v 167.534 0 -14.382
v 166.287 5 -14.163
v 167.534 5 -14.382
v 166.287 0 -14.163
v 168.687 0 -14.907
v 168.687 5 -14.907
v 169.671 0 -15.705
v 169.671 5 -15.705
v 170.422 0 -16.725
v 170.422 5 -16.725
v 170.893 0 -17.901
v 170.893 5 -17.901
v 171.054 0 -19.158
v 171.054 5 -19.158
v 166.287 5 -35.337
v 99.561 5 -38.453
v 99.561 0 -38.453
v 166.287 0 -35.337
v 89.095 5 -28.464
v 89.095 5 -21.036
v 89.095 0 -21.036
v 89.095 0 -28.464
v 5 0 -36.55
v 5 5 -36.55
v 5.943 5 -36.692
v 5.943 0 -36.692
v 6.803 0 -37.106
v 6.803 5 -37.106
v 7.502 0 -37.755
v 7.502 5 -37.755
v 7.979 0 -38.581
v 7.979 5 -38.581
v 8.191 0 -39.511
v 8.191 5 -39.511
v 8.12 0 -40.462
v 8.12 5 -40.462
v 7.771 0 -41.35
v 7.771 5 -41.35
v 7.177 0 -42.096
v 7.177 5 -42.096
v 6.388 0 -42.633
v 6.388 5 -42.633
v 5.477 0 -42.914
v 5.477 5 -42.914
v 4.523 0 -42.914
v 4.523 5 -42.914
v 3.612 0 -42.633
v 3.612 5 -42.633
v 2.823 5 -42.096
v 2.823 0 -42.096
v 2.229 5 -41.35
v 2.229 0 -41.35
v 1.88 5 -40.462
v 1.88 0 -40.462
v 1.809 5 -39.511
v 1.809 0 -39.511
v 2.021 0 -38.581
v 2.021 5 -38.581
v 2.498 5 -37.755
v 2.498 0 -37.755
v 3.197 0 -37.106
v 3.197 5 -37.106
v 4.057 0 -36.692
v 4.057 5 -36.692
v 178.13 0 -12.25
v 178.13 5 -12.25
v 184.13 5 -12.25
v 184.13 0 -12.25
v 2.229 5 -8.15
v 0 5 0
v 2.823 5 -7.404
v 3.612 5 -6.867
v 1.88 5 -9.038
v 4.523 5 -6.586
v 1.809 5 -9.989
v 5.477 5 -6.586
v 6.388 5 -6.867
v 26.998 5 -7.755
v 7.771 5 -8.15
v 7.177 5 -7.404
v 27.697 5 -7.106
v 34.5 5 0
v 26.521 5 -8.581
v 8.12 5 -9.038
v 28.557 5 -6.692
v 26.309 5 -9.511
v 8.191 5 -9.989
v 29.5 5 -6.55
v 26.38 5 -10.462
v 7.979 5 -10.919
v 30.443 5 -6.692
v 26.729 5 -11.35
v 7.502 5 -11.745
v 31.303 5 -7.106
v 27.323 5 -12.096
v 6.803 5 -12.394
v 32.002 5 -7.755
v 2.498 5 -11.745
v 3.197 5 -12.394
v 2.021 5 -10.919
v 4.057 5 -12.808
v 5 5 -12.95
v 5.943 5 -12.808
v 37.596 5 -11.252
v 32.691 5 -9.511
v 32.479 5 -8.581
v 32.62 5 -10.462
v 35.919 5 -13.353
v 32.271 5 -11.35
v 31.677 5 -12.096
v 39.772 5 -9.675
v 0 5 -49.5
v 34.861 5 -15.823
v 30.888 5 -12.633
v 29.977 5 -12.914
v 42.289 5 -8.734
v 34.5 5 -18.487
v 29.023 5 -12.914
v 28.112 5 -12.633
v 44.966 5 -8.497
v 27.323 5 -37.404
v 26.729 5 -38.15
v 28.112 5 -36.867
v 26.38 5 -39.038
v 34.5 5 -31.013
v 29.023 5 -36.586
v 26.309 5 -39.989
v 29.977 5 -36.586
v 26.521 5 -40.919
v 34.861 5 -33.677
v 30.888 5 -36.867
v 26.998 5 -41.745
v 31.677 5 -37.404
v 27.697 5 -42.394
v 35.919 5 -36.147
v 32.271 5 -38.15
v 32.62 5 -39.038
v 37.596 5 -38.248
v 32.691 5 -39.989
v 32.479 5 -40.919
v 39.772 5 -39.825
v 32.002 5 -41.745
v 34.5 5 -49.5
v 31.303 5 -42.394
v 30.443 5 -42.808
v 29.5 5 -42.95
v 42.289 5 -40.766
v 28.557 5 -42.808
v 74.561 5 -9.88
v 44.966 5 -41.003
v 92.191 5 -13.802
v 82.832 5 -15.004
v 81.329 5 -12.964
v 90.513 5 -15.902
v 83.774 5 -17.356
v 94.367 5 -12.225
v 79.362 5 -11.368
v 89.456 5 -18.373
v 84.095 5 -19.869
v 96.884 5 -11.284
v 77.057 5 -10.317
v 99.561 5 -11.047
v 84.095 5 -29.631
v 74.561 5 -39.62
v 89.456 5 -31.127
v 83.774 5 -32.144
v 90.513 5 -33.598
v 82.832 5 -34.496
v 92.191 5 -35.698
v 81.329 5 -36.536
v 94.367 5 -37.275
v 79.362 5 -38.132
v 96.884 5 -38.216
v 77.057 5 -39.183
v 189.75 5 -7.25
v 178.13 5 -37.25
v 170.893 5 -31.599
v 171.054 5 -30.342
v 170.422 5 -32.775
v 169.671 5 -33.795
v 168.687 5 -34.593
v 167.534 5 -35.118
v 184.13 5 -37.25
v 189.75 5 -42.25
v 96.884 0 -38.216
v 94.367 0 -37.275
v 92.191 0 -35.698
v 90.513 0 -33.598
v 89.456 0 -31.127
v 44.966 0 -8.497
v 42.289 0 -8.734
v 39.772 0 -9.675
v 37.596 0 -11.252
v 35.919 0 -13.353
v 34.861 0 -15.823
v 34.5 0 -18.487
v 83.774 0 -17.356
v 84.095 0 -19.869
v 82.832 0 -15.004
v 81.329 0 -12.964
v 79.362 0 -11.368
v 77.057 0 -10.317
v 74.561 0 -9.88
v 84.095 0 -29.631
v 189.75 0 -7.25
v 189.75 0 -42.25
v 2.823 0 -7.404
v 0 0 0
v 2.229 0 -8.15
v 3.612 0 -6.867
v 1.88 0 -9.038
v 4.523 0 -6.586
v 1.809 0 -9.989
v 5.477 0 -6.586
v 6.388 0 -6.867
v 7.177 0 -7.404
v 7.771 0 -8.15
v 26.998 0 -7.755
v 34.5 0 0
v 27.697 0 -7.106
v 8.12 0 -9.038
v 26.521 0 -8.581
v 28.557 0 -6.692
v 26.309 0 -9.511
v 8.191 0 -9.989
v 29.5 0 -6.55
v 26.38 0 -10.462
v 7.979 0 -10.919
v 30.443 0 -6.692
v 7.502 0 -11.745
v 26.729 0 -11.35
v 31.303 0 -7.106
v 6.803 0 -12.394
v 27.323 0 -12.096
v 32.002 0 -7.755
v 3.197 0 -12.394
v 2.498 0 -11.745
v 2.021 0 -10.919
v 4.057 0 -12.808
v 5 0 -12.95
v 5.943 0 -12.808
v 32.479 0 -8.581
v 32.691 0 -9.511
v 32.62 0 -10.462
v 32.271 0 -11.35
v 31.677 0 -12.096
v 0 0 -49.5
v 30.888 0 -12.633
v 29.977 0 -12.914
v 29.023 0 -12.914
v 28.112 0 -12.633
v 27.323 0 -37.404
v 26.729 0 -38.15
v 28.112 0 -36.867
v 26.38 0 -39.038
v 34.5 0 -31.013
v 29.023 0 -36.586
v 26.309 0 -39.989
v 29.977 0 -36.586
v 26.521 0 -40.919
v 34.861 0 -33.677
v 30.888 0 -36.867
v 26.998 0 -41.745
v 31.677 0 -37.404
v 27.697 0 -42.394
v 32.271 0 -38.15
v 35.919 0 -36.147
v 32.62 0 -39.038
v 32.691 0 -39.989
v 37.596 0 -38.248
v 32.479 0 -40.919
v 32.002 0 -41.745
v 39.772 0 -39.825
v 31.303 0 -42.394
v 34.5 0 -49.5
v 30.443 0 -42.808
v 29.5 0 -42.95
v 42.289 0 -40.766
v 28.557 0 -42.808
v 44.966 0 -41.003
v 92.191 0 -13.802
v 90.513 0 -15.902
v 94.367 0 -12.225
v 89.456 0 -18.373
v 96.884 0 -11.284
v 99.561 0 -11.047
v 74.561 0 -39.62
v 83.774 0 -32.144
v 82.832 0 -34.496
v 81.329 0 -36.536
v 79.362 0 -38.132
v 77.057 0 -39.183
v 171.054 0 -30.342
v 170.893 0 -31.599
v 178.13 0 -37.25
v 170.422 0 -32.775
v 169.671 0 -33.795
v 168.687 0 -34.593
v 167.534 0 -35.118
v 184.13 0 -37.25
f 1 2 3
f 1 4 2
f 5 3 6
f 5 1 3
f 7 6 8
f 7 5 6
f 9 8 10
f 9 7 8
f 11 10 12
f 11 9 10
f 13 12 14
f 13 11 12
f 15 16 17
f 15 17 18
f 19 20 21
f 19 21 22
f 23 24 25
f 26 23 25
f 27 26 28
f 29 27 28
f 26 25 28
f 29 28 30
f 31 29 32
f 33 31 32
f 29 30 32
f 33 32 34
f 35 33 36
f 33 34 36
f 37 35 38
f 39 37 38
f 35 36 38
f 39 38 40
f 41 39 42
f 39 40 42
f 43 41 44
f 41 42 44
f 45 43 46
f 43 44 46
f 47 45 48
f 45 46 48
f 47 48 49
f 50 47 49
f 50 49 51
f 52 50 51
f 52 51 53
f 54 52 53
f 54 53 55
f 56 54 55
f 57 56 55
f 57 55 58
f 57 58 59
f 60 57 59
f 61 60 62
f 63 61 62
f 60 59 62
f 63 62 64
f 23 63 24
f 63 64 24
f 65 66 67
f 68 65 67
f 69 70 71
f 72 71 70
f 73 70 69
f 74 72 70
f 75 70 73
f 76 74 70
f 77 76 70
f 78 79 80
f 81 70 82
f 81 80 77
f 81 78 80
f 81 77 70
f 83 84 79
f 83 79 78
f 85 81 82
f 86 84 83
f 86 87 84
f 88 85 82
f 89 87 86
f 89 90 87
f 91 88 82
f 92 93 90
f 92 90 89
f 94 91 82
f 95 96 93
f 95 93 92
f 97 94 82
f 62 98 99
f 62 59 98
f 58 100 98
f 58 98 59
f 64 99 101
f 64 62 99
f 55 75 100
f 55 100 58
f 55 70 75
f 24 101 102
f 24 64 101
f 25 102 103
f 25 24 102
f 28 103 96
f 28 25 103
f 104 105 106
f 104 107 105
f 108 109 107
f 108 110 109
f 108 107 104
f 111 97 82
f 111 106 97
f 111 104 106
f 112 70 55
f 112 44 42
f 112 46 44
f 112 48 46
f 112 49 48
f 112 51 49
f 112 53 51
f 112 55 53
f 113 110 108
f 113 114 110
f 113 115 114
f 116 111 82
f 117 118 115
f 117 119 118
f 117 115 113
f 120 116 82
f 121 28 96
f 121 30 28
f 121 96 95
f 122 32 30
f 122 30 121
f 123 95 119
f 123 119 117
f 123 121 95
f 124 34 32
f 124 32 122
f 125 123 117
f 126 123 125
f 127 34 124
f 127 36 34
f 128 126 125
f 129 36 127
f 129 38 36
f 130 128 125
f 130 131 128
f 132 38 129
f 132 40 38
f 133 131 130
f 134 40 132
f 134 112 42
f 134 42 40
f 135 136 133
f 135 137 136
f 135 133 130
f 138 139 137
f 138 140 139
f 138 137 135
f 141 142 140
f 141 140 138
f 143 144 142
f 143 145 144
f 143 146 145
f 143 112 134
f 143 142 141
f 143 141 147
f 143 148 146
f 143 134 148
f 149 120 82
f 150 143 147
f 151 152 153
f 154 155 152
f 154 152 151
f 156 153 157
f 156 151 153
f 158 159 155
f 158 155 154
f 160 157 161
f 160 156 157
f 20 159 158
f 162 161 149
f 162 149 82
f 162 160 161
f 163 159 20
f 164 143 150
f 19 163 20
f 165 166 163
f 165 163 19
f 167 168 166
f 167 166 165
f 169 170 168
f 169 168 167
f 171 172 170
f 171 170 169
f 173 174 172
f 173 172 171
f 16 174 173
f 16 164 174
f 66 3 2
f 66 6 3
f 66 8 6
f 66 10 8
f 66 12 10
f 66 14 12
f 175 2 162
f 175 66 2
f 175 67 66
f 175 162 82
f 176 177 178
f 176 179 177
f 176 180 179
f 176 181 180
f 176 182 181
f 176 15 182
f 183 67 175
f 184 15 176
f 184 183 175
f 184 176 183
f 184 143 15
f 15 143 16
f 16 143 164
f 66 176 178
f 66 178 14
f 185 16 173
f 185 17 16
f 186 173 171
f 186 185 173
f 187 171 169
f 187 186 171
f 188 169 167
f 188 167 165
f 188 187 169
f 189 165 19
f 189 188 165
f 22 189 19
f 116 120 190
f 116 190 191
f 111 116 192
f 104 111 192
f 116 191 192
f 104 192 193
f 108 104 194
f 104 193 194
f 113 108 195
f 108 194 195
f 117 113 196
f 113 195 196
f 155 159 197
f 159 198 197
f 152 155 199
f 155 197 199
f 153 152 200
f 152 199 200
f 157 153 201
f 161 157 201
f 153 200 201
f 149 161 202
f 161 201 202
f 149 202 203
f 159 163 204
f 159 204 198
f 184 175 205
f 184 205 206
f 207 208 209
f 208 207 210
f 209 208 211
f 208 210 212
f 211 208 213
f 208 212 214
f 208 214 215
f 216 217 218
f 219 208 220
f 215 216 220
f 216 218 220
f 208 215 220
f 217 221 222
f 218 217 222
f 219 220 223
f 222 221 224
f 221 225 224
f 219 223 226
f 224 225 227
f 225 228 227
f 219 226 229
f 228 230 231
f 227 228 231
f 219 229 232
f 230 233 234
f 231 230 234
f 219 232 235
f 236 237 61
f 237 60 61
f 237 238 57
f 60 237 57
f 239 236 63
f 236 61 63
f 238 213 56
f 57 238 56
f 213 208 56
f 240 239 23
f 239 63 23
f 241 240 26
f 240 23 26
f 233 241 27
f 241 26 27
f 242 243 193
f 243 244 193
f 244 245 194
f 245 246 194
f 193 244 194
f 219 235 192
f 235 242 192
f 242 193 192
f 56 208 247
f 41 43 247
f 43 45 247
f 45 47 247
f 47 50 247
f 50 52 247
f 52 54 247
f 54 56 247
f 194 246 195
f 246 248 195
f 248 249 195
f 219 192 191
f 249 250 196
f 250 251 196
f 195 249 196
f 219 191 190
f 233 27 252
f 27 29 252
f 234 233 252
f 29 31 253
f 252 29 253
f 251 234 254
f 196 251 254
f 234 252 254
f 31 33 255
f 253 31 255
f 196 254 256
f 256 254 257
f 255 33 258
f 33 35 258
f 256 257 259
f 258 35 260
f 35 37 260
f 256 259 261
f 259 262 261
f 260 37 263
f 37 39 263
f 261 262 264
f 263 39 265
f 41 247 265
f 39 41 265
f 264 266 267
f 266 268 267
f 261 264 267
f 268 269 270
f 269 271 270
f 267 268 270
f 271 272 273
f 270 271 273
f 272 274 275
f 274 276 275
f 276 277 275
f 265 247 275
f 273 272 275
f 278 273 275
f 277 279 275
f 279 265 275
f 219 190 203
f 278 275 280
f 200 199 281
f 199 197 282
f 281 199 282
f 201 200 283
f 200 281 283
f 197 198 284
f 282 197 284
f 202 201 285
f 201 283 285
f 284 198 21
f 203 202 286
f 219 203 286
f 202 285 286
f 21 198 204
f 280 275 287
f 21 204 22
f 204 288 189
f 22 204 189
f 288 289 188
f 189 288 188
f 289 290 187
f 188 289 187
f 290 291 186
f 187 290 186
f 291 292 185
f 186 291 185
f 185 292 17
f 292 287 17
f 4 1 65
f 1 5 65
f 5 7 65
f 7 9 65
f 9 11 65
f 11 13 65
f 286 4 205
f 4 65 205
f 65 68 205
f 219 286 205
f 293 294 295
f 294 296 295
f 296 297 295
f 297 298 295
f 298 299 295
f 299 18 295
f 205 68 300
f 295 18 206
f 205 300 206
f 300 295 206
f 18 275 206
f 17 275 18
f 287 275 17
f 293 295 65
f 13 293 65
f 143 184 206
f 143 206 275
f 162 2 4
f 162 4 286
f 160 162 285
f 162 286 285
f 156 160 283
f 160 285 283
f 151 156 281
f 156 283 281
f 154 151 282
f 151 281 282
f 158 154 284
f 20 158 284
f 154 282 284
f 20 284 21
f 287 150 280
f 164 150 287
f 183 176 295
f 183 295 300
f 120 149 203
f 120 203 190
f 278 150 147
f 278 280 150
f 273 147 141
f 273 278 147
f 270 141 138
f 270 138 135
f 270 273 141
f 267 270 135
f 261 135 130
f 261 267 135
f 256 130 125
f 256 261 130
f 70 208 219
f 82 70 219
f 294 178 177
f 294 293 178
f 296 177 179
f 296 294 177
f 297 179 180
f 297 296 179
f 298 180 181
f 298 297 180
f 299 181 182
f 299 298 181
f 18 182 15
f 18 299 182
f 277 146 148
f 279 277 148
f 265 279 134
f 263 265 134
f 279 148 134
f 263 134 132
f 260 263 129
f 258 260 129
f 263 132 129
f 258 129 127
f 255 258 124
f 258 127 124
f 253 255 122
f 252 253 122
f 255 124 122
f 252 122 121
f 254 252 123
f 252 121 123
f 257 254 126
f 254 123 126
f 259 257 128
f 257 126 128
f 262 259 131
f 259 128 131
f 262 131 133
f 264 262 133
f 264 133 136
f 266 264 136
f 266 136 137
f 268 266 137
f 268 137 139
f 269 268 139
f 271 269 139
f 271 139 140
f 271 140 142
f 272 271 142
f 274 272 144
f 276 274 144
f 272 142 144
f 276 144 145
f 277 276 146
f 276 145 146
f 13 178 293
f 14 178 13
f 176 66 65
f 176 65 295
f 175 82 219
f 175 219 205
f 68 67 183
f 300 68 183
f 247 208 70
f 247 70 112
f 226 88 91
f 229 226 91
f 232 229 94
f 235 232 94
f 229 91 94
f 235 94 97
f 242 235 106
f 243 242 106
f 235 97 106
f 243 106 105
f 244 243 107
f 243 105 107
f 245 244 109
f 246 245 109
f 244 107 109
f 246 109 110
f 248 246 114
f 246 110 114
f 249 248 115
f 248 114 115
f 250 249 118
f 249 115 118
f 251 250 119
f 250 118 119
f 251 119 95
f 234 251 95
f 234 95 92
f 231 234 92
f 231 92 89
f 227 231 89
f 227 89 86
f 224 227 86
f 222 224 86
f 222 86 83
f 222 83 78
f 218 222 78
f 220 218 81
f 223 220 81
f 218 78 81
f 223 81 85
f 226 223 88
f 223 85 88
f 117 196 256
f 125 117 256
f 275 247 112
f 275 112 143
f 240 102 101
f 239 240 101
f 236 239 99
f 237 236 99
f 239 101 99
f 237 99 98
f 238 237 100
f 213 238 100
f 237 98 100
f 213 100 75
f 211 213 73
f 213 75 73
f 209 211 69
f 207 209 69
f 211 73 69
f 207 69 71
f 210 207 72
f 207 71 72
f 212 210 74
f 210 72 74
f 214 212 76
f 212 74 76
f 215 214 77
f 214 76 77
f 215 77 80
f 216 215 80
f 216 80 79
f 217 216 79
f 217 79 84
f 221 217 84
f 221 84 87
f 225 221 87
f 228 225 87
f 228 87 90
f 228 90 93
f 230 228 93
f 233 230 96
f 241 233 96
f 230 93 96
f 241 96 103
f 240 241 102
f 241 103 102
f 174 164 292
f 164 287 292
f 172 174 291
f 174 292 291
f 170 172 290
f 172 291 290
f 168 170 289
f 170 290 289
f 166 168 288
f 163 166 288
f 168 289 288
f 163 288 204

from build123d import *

# Parameters (mm, degrees)
SKETCH1_W           = 34.5
SKETCH1_H           = 49.5
BOSS_EXTRUDE1_DEPTH = 5
SKETCH2_R           = 3.2
CUT_EXTRUDE1_DEPTH  = 5
SKETCH3_W           = 6
SKETCH3_H           = 25
BOSS_EXTRUDE2_DEPTH = 5
FILLET1_R           = 10
FILLET2_R           = 5


with BuildPart() as part:
    # Sketch1 → Boss-Extrude1 (new body)
    with BuildSketch(Plane(origin=(0, 0, 0), x_dir=(1, 0, 0), z_dir=(0, 1, 0))):
        with Locations((17.25, 24.75)):
            Rectangle(SKETCH1_W, SKETCH1_H)
    extrude(amount=BOSS_EXTRUDE1_DEPTH)

    # Sketch2 → Cut-Extrude1 (cut)
    with BuildSketch(Plane(origin=(0, 5, 0), x_dir=(1, 0, 0), z_dir=(0, 1, 0))):
        with Locations(Location((5, 39.75, 0), (0, 0, 270))):
            Circle(SKETCH2_R)
        with Locations(Location((5, 9.75, 0), (0, 0, 90))):
            Circle(SKETCH2_R)
        with Locations(Location((29.5, 9.75, 0), (0, 0, 270))):
            Circle(SKETCH2_R)
        with Locations(Location((29.5, 39.75, 0), (0, 0, 90))):
            Circle(SKETCH2_R)
    extrude(amount=-CUT_EXTRUDE1_DEPTH, mode=Mode.SUBTRACT)

    # Sketch3 → Boss-Extrude2 (add)
    with BuildSketch(Plane(origin=(0, 5, 0), x_dir=(1, 0, 0), z_dir=(0, 1, 0))):
        Polygon((189.75, 42.25), (34.5, 49.5), (34.5, 41.491281612), (84.094915791, 39.175254948), (84.094915791, 10.324745052), (34.5, 8.008718388), (34.5, 0), (189.75, 7.25), align=None)
        Polygon((171.053500921, 14.385612956), (89.094915791, 10.558239416), (89.094915791, 38.941760584), (171.053500921, 35.114387044), align=None, mode=Mode.SUBTRACT)
        with Locations((181.13, 24.75)):
            Rectangle(SKETCH3_W, SKETCH3_H, mode=Mode.SUBTRACT)
    extrude(amount=-BOSS_EXTRUDE2_DEPTH)

    # Fillet1
    fillet1_edges = [part.edges().sort_by_distance(p)[0] for p in [
        (34.5, 2.5, -8.008718388),
        (84.094915791, 2.5, -10.324745052),
        (84.094915791, 2.5, -39.175254948),
        (34.5, 2.5, -41.491281612),
        (89.094915791, 2.5, -38.941760584),
        (89.094915791, 2.5, -10.558239416),
    ]]
    fillet(fillet1_edges, radius=FILLET1_R)

    # Fillet2
    fillet2_edges = [part.edges().sort_by_distance(p)[0] for p in [
        (171.053500921, 2.5, -35.114387044),
        (171.053500921, 2.5, -14.385612956),
    ]]
    fillet(fillet2_edges, radius=FILLET2_R)


solid = part.part
